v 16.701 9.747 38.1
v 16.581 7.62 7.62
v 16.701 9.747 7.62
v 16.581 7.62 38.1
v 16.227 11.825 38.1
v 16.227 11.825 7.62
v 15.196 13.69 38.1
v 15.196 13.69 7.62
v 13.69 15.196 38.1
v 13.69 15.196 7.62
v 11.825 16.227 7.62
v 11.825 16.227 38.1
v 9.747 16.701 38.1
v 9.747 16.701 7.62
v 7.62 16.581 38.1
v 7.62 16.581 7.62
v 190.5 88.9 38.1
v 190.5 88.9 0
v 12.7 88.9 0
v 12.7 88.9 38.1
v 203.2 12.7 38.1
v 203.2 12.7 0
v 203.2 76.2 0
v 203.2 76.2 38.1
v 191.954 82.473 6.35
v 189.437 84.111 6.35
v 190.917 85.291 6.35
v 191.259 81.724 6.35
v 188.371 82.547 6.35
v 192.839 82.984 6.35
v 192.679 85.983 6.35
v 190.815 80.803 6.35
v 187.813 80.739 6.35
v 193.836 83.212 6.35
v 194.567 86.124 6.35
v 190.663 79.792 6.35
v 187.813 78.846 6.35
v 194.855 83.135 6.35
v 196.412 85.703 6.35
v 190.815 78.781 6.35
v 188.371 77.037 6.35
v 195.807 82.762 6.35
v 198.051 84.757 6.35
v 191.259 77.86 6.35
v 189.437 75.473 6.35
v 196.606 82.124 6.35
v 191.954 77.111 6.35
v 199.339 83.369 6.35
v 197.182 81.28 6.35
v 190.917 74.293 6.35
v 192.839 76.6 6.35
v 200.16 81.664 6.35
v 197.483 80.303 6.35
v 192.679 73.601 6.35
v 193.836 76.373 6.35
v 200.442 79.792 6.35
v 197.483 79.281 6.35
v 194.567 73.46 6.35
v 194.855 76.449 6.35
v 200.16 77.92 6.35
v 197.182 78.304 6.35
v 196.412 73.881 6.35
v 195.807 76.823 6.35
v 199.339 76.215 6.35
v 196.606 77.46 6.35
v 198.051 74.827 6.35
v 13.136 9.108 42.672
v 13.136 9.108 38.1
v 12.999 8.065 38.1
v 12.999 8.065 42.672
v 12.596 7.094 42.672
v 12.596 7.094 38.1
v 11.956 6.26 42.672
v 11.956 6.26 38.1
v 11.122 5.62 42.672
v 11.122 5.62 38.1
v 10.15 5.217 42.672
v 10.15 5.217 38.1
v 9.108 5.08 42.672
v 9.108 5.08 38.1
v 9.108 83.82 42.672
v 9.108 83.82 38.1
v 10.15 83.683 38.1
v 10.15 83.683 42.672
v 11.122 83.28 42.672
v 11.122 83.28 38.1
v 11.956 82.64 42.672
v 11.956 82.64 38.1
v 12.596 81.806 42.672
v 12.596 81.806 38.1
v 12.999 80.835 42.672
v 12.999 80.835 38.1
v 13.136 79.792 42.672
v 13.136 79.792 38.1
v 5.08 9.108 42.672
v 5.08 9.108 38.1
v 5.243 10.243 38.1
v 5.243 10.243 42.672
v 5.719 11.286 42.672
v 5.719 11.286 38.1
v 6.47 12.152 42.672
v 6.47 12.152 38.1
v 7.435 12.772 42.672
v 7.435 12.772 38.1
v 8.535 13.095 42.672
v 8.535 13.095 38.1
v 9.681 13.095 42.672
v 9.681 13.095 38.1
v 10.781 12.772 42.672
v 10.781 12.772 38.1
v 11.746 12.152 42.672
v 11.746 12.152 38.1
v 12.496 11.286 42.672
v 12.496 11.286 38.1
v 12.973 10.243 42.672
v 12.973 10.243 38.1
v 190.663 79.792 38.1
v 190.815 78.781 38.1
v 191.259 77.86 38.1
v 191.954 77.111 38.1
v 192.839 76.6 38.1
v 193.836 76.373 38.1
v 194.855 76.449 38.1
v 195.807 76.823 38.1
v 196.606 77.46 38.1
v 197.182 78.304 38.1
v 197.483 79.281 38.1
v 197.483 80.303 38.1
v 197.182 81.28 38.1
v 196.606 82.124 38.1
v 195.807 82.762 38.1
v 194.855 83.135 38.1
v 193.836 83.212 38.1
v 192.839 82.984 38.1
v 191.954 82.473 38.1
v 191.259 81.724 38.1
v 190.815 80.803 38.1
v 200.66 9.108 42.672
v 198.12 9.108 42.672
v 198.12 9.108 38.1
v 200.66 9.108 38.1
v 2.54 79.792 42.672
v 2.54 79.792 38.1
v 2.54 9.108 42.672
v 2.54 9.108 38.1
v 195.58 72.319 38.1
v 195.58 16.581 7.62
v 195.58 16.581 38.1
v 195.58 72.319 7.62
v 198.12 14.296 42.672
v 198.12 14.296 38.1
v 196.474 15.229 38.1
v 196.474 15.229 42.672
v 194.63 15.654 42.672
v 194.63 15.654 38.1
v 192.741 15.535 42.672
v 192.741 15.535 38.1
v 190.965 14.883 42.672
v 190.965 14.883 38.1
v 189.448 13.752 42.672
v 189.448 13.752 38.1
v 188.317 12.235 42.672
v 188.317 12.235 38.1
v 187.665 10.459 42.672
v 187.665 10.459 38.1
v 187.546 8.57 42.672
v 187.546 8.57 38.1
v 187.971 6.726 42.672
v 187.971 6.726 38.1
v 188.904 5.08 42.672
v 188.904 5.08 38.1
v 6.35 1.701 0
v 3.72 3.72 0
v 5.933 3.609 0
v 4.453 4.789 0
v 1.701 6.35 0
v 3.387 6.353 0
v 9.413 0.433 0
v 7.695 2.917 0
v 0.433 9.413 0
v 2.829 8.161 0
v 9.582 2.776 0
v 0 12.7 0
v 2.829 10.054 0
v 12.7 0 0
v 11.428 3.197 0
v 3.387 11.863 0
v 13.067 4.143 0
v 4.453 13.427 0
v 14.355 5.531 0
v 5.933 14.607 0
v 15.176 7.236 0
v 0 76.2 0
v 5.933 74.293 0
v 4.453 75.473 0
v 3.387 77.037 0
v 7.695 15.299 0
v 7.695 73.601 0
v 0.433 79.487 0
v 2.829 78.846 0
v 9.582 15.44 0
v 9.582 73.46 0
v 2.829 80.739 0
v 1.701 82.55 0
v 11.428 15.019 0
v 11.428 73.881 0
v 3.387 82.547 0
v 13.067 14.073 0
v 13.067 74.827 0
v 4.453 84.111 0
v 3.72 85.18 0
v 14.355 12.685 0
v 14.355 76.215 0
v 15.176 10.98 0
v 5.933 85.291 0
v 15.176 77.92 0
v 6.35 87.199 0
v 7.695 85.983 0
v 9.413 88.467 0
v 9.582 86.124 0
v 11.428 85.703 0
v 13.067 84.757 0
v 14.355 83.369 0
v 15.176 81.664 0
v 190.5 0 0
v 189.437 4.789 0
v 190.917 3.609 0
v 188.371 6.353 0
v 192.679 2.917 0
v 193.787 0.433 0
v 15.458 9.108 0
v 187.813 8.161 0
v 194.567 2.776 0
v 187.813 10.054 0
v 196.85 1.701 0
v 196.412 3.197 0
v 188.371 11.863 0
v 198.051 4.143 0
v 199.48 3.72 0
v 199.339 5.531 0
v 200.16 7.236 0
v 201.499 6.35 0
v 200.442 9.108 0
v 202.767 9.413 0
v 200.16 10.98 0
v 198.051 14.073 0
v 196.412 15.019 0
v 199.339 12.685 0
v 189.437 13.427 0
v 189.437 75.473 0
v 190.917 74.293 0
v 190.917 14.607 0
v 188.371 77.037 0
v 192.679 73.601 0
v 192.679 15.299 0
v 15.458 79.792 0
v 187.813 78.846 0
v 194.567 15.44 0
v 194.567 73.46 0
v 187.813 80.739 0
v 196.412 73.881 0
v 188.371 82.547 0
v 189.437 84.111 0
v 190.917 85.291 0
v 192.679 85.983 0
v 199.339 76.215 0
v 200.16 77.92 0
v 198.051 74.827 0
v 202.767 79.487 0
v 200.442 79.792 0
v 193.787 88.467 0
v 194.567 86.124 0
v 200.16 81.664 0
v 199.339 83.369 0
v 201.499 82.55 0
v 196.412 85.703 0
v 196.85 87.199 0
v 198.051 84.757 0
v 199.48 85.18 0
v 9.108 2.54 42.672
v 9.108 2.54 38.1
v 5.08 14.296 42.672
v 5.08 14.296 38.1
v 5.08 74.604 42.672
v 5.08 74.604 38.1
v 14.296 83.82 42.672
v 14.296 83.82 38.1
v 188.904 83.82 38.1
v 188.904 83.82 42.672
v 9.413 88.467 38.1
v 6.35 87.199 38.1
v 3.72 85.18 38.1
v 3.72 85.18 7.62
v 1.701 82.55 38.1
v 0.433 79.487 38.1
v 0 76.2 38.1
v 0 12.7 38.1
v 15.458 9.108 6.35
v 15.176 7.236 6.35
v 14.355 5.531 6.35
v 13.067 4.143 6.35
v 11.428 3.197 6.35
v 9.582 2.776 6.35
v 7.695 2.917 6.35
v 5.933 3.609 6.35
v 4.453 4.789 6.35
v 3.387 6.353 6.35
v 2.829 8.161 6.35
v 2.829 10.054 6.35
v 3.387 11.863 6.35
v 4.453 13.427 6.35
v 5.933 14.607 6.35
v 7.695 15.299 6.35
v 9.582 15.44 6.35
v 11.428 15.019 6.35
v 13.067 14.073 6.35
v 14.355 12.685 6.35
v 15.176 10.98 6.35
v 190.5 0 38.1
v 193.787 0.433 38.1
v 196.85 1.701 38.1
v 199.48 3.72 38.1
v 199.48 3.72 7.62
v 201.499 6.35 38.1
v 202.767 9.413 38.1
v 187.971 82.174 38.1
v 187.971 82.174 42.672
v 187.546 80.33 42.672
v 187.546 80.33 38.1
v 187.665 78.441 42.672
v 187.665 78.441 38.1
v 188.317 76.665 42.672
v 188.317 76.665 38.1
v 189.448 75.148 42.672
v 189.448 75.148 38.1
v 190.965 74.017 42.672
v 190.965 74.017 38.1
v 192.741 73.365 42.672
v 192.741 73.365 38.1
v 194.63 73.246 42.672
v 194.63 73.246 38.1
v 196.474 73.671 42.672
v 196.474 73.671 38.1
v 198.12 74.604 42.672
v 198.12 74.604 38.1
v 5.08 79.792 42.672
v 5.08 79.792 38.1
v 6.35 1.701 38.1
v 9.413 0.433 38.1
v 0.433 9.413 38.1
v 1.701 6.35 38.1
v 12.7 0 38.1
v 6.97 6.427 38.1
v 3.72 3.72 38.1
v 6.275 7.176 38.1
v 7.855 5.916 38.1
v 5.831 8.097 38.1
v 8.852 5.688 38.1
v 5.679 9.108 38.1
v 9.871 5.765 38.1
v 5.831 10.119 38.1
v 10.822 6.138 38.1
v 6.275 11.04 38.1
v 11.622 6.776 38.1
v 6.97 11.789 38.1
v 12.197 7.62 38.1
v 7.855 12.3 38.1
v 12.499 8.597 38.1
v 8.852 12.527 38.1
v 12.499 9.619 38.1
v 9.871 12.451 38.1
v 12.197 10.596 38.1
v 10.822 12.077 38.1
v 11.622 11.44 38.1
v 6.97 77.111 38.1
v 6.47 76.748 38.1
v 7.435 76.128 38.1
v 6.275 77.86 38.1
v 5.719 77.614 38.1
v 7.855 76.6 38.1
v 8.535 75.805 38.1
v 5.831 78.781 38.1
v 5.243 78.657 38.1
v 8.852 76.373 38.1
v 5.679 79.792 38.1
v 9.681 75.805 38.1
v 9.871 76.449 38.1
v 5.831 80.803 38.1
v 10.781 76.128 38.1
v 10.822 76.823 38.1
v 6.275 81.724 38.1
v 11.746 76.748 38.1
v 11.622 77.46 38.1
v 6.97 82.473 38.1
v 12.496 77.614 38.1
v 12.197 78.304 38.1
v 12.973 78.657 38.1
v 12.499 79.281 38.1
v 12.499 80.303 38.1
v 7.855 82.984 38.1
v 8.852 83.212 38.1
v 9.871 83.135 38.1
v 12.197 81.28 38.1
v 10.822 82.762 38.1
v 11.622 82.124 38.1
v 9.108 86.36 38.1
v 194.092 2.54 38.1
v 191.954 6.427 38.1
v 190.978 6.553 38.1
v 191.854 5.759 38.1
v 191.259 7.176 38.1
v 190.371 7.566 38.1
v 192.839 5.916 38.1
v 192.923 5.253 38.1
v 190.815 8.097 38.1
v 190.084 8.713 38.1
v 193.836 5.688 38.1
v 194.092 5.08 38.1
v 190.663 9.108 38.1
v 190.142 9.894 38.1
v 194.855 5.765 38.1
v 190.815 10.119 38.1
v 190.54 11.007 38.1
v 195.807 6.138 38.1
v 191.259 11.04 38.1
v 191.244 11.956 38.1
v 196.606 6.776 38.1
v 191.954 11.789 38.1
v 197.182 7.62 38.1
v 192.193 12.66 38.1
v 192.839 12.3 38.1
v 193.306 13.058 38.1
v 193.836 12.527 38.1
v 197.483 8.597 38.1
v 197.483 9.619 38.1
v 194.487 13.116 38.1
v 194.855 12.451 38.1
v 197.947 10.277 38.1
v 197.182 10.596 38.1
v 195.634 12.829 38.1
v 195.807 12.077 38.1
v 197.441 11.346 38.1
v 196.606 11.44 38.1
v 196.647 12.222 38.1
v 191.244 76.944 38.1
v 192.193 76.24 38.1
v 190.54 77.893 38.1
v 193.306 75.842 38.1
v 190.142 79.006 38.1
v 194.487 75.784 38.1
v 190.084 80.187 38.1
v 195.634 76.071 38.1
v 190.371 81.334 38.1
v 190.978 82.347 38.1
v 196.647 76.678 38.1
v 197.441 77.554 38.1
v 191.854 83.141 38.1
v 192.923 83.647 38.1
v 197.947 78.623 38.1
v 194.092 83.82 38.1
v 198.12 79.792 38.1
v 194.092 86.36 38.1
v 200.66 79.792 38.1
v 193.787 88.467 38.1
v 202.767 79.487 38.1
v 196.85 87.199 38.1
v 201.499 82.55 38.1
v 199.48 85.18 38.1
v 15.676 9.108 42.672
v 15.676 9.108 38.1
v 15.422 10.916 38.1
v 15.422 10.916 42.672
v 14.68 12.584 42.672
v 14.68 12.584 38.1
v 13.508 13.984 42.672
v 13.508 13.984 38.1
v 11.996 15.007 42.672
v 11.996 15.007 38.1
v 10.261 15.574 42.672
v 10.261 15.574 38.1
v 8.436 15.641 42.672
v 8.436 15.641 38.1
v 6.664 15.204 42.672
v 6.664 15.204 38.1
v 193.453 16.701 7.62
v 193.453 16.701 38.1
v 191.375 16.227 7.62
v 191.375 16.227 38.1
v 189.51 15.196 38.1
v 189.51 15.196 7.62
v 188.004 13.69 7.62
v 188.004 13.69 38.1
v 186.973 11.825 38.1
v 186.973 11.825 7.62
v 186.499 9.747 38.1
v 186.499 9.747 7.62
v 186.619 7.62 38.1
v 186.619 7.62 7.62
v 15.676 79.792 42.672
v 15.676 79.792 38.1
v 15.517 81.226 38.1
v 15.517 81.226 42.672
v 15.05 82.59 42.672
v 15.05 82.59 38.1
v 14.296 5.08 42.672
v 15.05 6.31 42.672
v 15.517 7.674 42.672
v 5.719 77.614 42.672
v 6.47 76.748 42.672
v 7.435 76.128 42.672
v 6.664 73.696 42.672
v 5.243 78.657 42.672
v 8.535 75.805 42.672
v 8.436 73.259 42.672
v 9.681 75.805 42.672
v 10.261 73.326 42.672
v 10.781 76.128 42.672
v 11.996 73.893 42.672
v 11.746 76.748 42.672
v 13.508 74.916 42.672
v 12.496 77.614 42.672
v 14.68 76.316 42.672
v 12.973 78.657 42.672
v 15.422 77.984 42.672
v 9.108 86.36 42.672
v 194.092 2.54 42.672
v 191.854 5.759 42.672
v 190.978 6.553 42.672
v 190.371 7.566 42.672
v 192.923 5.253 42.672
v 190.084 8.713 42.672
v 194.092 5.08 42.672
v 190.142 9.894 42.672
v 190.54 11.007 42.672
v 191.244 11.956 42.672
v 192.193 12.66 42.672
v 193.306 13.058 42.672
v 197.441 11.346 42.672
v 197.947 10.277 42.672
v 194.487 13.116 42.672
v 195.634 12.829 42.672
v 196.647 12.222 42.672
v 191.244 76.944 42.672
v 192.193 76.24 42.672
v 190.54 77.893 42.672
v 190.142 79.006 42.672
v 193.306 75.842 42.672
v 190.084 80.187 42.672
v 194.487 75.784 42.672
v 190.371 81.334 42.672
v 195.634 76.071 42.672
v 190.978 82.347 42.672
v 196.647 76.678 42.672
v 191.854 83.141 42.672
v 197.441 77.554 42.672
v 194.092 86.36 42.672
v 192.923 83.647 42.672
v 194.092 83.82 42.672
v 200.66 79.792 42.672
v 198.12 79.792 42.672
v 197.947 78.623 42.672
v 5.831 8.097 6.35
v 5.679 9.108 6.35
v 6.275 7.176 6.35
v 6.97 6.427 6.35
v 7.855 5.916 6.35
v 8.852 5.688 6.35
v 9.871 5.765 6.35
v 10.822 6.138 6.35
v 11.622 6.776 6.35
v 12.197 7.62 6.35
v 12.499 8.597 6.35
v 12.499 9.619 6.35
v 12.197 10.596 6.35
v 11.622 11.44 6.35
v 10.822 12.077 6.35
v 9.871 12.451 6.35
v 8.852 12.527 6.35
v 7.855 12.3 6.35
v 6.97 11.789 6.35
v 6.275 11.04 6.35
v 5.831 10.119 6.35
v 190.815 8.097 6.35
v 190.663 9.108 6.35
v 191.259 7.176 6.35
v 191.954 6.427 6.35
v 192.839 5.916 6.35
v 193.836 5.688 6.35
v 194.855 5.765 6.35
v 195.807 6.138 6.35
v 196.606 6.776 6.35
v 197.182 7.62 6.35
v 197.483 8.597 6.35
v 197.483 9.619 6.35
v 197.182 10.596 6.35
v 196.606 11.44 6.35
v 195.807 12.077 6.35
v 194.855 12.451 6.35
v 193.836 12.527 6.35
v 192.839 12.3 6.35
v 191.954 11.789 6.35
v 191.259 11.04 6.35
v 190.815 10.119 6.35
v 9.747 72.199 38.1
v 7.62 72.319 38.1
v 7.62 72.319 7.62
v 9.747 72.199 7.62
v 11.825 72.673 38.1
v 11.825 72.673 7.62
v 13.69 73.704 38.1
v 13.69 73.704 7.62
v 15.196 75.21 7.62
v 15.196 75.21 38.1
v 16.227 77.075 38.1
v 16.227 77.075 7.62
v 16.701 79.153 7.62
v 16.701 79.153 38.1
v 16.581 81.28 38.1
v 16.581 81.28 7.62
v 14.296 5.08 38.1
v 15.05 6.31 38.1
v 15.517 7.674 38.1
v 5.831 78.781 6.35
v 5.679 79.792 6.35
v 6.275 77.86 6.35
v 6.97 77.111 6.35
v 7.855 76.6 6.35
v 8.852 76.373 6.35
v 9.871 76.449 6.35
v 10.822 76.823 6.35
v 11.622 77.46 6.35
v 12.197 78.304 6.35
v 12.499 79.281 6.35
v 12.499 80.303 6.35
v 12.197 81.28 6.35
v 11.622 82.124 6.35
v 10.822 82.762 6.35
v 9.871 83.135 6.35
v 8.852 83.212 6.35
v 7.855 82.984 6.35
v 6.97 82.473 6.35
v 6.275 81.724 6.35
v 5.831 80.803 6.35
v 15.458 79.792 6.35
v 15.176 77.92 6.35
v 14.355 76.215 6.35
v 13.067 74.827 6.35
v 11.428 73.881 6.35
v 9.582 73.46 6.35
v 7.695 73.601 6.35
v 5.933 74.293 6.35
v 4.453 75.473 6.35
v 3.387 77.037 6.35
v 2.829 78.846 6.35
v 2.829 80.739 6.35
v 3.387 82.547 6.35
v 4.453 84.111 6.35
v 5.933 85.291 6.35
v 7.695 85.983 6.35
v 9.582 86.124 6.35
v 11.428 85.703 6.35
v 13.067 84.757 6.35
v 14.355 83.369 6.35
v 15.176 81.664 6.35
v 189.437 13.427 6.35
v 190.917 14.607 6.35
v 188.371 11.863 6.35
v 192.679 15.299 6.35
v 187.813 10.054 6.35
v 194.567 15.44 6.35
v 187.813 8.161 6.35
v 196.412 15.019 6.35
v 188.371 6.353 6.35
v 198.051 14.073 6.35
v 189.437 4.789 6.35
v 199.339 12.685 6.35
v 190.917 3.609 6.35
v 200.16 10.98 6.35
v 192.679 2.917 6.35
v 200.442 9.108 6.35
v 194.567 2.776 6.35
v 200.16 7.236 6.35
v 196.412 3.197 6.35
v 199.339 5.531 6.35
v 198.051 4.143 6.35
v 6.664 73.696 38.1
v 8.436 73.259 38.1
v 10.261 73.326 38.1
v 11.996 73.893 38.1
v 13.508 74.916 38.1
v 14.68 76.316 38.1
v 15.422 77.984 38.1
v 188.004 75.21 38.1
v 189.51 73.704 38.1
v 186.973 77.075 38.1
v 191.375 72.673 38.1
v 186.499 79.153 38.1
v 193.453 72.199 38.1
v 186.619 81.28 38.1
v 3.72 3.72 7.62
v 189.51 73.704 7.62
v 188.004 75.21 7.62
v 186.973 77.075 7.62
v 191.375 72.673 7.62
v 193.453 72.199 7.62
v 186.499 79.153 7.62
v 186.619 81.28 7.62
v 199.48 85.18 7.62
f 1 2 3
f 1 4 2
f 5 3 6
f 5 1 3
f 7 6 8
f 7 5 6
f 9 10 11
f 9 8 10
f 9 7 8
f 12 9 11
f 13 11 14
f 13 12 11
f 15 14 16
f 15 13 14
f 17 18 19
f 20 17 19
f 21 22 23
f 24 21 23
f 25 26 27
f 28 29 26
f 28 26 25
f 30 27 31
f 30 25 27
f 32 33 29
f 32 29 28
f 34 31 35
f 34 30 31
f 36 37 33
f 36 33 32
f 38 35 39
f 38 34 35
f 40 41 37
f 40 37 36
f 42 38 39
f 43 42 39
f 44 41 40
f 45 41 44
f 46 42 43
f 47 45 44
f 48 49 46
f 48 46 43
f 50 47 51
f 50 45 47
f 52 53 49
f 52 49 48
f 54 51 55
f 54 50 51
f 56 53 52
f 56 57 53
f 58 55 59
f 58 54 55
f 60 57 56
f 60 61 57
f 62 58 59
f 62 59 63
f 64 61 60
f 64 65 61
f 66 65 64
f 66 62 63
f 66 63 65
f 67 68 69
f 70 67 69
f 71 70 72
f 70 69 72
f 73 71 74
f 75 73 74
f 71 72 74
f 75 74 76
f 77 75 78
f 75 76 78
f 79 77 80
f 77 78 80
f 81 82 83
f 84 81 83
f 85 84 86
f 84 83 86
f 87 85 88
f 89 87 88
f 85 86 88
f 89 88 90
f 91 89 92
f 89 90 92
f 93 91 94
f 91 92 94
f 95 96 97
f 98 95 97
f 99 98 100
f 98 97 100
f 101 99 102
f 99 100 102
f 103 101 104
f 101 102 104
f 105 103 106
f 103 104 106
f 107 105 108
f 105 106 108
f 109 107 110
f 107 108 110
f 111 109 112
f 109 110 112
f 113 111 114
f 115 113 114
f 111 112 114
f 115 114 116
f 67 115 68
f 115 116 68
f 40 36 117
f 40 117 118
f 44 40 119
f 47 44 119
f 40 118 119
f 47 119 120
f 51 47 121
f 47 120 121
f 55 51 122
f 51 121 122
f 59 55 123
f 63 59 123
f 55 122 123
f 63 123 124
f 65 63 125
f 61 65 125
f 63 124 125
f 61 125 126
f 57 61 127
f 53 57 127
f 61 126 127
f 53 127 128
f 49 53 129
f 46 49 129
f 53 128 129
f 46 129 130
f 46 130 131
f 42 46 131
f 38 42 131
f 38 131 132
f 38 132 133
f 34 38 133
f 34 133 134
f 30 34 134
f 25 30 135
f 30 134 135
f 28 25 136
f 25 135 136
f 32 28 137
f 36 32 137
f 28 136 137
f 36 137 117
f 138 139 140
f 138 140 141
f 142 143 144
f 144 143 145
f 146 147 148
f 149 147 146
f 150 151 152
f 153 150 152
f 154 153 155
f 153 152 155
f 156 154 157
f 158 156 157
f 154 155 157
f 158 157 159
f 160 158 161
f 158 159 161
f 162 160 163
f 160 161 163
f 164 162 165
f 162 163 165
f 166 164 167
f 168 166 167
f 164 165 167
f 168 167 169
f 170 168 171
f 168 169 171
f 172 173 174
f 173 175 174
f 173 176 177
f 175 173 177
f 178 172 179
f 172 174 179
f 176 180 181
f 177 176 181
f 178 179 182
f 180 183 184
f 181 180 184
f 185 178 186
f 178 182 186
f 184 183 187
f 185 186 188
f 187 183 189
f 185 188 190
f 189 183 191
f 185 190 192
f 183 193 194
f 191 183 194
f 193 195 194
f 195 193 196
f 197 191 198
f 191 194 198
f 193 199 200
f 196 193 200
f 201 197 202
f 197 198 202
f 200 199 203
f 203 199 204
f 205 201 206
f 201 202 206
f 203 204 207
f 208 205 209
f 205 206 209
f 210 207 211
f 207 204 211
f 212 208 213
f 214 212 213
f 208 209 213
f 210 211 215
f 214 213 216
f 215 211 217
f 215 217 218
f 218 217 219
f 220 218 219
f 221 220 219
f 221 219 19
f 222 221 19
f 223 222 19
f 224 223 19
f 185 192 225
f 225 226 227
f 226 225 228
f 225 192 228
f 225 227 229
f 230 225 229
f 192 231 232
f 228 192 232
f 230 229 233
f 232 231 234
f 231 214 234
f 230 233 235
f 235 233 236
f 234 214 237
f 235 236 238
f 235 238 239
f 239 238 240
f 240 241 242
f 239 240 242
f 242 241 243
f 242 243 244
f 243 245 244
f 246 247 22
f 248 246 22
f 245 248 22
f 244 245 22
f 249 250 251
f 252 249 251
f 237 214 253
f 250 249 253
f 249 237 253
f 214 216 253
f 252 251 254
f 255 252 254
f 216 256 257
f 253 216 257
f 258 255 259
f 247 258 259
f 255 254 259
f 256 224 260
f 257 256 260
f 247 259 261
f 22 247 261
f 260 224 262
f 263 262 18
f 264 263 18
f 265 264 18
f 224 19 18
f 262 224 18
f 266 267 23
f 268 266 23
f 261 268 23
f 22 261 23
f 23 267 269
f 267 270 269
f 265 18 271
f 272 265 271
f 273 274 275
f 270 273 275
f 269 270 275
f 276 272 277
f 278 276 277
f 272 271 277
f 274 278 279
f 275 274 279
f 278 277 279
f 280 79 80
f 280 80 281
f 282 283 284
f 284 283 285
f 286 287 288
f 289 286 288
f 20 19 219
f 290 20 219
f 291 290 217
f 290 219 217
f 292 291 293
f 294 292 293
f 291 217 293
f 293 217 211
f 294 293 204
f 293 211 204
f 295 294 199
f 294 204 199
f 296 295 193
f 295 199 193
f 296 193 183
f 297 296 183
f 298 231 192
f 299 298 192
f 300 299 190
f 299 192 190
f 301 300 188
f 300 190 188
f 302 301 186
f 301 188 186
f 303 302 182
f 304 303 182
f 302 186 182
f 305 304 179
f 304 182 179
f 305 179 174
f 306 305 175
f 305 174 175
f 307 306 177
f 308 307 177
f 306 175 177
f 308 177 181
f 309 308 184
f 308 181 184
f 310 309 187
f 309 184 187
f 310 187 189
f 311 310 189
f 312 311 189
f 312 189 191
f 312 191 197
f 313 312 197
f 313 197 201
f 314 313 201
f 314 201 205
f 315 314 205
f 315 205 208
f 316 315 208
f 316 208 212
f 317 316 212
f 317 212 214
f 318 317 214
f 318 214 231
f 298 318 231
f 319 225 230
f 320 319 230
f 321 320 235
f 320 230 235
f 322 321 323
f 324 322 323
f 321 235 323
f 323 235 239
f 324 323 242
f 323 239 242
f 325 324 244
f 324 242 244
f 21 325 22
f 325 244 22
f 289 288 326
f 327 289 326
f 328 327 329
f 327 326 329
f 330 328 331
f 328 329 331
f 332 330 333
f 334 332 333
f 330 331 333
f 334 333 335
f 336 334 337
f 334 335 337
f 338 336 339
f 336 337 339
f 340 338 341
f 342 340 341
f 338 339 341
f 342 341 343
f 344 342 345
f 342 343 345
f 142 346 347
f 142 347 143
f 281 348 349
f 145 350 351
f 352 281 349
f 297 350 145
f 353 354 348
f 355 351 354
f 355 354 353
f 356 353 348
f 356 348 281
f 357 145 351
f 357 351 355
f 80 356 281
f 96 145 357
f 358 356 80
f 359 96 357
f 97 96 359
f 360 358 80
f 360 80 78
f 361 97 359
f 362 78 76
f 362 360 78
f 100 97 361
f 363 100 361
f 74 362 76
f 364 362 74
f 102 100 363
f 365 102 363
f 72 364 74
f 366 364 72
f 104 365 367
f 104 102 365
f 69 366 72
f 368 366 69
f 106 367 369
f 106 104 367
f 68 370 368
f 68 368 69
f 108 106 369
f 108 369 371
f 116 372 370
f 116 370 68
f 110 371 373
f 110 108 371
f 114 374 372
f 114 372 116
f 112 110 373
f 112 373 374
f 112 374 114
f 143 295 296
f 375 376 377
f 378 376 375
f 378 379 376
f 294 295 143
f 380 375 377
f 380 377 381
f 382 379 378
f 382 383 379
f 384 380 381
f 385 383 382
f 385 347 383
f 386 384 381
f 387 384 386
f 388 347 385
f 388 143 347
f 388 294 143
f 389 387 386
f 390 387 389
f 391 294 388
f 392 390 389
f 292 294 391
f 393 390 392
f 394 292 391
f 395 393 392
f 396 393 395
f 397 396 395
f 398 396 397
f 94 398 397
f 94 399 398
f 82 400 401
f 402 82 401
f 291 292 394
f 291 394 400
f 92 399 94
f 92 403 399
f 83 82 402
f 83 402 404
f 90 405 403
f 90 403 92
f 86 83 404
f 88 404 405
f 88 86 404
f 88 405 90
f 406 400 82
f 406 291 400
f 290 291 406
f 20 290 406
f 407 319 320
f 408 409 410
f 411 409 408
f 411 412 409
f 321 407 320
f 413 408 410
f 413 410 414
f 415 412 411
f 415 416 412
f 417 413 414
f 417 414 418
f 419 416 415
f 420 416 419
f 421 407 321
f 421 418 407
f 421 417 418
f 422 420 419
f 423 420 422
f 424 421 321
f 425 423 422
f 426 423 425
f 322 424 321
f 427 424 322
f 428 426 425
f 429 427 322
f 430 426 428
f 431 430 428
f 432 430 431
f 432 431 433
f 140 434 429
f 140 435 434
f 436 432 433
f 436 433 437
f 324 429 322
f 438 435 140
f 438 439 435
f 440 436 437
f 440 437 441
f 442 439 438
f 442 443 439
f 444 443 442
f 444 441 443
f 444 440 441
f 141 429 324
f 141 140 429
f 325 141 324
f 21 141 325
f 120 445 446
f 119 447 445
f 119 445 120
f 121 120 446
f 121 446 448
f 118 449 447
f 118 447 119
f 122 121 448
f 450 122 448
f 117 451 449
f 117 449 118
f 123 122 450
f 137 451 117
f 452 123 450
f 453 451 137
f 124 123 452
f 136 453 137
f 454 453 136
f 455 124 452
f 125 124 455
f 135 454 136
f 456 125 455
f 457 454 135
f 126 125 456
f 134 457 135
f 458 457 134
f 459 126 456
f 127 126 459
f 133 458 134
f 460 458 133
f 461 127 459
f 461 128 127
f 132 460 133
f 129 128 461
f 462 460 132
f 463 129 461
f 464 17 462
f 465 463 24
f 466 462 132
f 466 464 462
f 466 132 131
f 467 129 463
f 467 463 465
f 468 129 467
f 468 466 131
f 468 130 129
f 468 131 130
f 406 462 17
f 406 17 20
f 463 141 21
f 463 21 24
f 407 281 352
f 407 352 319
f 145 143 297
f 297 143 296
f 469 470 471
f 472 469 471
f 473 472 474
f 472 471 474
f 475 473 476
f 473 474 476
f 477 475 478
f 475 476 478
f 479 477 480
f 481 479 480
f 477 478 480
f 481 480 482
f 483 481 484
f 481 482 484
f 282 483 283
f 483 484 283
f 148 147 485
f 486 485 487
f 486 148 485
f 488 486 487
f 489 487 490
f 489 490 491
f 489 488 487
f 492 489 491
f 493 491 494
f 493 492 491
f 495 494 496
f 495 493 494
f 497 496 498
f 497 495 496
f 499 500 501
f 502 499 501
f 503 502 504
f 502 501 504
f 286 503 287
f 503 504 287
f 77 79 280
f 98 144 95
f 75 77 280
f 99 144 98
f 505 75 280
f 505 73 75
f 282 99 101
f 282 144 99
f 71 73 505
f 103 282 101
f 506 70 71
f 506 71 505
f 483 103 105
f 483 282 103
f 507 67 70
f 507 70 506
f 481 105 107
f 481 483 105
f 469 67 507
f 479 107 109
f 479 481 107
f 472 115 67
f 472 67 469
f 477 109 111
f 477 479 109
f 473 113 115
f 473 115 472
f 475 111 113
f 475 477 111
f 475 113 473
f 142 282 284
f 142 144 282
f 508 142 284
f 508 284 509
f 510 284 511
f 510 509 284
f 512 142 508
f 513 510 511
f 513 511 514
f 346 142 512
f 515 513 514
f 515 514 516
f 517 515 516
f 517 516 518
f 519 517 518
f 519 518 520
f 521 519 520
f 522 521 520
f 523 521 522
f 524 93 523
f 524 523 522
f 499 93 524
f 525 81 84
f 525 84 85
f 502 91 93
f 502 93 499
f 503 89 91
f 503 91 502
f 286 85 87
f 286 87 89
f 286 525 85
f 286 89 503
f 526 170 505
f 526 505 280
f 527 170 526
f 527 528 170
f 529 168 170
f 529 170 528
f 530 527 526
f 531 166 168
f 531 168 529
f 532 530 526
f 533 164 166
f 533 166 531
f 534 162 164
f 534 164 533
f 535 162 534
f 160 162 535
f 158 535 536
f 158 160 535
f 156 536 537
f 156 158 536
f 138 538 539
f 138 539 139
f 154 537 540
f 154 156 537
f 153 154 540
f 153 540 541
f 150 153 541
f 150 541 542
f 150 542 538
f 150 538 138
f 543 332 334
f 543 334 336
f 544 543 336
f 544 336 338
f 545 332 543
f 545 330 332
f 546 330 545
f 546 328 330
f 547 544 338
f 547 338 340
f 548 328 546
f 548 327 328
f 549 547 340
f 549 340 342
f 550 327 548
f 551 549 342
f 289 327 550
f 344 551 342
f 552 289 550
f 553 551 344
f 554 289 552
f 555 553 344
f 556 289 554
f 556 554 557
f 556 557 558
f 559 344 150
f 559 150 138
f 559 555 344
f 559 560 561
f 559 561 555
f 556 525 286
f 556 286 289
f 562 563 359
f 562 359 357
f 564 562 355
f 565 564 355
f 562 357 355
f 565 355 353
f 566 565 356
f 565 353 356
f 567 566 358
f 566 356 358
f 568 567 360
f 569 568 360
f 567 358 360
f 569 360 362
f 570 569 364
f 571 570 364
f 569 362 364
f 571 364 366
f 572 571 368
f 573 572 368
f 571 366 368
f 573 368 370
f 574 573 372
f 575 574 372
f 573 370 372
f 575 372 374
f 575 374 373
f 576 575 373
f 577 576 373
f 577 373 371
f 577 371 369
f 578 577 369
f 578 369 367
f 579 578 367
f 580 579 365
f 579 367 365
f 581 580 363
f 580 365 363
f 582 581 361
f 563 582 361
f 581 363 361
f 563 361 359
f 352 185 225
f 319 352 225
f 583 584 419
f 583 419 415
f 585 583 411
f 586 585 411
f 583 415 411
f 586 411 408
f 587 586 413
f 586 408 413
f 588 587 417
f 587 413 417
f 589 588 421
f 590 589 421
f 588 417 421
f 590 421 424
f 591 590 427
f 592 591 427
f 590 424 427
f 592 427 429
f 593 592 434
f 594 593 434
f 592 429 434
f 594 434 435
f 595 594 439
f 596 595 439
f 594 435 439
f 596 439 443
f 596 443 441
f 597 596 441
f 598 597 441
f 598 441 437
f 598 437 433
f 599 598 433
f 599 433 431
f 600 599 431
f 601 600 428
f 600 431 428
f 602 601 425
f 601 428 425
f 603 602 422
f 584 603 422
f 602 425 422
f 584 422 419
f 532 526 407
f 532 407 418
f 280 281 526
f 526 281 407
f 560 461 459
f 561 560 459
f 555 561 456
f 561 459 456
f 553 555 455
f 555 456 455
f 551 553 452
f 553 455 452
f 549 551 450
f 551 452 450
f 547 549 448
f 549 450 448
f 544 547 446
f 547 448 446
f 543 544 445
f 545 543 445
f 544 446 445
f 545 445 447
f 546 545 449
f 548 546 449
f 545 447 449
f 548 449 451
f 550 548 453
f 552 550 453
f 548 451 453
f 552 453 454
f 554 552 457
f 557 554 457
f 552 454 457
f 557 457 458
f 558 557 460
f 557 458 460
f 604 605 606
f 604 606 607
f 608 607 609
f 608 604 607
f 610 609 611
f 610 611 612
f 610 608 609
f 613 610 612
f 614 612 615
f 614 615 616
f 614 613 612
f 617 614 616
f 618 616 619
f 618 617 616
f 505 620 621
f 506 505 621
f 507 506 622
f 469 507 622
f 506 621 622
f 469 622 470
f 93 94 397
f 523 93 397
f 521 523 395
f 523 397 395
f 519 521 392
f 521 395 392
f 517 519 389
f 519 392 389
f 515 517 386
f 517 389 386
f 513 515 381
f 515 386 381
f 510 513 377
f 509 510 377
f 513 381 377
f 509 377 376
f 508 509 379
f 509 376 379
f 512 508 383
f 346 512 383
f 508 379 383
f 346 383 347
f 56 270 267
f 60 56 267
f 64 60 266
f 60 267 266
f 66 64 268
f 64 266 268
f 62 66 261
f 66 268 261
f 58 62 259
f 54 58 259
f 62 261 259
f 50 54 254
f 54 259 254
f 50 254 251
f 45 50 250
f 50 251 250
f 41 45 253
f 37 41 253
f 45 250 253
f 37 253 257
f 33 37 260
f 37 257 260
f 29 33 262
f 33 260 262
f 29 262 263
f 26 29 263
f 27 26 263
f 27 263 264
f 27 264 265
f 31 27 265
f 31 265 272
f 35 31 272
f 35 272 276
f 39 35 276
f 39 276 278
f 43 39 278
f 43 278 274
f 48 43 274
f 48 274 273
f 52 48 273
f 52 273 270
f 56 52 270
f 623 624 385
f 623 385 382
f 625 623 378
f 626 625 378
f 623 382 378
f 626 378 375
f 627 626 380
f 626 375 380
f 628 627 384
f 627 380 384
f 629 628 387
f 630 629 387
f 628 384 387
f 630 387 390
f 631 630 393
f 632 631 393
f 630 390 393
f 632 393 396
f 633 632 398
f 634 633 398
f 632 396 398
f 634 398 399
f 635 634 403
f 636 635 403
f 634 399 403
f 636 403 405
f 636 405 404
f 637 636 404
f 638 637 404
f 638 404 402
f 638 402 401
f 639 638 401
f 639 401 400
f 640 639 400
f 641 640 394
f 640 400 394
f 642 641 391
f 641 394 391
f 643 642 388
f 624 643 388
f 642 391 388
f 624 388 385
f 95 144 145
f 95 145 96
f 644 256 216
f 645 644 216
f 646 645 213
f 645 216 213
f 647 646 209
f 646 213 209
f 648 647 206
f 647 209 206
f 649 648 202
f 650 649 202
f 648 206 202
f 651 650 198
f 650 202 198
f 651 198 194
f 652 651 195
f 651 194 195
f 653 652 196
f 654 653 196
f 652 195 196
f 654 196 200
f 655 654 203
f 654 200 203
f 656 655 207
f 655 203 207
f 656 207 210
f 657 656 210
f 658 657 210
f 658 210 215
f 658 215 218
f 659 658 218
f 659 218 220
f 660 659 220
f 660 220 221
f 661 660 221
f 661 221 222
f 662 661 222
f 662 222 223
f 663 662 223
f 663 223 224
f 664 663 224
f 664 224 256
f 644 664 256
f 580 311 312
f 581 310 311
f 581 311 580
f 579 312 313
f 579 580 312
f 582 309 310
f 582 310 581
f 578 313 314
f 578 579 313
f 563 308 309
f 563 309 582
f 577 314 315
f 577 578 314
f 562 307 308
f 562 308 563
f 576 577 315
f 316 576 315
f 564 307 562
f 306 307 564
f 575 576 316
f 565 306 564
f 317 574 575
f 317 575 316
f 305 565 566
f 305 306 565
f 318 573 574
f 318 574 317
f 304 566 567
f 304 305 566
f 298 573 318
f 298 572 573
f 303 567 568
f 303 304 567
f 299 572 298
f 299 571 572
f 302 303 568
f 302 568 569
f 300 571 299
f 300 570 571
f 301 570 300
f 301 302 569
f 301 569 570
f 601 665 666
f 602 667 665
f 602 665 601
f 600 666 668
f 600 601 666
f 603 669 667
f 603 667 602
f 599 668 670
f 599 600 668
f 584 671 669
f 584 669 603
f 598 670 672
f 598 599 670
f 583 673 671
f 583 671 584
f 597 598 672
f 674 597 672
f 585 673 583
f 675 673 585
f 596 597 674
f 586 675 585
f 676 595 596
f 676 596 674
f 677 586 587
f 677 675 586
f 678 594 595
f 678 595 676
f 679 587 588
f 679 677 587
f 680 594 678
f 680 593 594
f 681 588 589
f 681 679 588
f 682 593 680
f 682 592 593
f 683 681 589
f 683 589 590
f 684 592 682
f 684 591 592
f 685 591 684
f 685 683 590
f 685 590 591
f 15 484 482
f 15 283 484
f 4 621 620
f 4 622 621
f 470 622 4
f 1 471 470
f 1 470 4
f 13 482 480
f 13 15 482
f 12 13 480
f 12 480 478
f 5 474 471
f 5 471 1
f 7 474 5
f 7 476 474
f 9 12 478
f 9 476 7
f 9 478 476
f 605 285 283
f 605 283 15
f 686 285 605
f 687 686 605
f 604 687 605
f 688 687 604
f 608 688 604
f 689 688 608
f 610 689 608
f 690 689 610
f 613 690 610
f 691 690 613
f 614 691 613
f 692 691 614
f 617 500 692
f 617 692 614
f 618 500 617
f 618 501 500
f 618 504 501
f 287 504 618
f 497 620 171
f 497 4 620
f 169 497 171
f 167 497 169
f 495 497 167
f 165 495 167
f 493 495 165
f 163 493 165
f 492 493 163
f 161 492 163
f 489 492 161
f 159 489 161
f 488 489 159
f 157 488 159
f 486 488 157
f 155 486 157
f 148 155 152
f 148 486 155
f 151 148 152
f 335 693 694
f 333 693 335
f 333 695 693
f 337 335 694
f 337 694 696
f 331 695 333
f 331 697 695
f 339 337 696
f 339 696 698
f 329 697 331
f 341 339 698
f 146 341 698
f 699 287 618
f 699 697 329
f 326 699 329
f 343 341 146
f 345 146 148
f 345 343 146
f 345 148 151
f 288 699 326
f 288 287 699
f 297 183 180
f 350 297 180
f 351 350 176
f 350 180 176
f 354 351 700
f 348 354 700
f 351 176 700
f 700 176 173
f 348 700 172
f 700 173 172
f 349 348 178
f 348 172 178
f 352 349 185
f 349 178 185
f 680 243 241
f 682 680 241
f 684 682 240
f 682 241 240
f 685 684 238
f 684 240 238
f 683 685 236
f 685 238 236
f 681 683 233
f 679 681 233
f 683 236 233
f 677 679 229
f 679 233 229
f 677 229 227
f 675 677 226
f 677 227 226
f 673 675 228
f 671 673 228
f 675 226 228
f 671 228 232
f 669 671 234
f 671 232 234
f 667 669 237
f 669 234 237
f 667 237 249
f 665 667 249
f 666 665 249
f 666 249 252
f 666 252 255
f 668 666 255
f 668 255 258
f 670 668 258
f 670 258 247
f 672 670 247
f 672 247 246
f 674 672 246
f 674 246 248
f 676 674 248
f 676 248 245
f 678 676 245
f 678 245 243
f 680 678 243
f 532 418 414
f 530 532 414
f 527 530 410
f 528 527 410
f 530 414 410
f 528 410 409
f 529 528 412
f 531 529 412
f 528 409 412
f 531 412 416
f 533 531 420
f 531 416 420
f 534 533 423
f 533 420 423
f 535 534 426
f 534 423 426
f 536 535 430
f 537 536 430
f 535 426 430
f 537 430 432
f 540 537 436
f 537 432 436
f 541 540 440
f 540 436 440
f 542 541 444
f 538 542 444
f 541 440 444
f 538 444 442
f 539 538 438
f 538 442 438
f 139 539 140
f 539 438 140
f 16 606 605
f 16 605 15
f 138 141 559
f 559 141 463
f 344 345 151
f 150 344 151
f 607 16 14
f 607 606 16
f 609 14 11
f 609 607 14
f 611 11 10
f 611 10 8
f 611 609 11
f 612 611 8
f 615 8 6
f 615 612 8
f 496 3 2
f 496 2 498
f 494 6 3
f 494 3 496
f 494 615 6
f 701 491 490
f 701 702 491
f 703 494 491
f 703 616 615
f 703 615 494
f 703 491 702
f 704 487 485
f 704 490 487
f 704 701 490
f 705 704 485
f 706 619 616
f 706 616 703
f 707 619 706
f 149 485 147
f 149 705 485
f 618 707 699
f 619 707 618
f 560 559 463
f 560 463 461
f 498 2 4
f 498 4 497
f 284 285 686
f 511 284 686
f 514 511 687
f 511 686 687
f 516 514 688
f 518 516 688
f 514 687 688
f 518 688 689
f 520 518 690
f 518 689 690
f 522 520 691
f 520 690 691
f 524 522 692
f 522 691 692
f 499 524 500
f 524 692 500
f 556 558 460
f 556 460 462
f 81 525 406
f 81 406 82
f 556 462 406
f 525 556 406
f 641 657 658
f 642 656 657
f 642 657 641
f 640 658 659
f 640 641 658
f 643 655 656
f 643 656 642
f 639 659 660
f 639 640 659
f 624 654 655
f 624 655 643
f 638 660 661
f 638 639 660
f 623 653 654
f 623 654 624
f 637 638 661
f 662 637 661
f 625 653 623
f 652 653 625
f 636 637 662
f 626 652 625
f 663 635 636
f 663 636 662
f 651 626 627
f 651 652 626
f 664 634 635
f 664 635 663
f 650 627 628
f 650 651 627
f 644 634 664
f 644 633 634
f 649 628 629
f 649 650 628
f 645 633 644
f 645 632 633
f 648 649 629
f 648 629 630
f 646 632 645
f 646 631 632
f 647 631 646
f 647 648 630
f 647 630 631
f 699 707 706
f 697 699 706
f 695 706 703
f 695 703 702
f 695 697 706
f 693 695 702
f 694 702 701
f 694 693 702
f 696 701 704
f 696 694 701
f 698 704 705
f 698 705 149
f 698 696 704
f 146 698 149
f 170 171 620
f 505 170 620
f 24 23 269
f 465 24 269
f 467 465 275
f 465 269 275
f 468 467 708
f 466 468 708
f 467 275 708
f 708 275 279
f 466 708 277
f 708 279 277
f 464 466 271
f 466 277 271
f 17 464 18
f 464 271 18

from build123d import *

# Parameters (mm, degrees)
F1_DEPTH       = 38.1
F2_T           = -7.62
F3_R           = 7.62
F4_DEPTH       = 30.48
F6_DEPTH       = 4.572
F8_D           = 6.858
F8_CBORE_D     = 12.7
F8_CBORE_DEPTH = 6.35


with BuildPart() as f1:
    # F0 (on Top) → F1 (new body)
    with BuildSketch(Plane.XY):
        with BuildLine():
            ThreePointArc((0, 12.7), (3.7197438789, 3.7197438789), (12.7, 0))
            Line((12.7, 0), (190.5, 0))
            ThreePointArc((190.5, 0), (199.4802561211, 3.7197438789), (203.2, 12.7))
            Line((203.2, 12.7), (203.2, 44.45))
            Line((203.2, 44.45), (203.2, 76.2))
            ThreePointArc((203.2, 76.2), (199.4802561211, 85.1802561211), (190.5, 88.9))
            Line((190.5, 88.9), (12.7, 88.9))
            ThreePointArc((12.7, 88.9), (3.7197438789, 85.1802561211), (0, 76.2))
            Line((0, 76.2), (0, 44.45))
            Line((0, 44.45), (0, 12.7))
        make_face()
    extrude(amount=F1_DEPTH)

    # F2
    f2_openings = [f1.faces().sort_by_distance(p)[0] for p in [
        (101.6, 44.45, 38.1),
    ]]
    offset(amount=F2_T, openings=f2_openings)

    # F3 (on face) → F4 (join, through all)
    with BuildSketch(Plane.XY.offset(38.1)):
        with Locations((9.1078975516, 79.7921024484)):
            Circle(F3_R)
        with Locations((194.0921024484, 79.7921024484)):
            Circle(F3_R)
        with Locations((9.1078975516, 9.1078975516)):
            Circle(F3_R)
        with Locations((194.0921024484, 9.1078975516)):
            Circle(F3_R)
    extrude(amount=-F4_DEPTH)

    # F5 (on face) → F6 (join)
    with BuildSketch(Plane.XY.offset(38.1)):
        with BuildLine():
            ThreePointArc((14.2957024402, 83.82), (11.9960162975, 85.6909199873), (9.1078975516, 86.36))
            Line((9.1078975516, 86.36), (9.1078975516, 83.82))
            ThreePointArc((9.1078975516, 83.82), (11.9560512242, 82.6402561211), (13.1357951031, 79.7921024484))
            ThreePointArc((13.1357951031, 79.7921024484), (9.1078975516, 75.7642048969), (5.08, 79.7921024484))
            Line((5.08, 79.7921024484), (2.54, 79.7921024484))
            ThreePointArc((2.54, 79.7921024484), (3.2090800127, 76.9039837025), (5.08, 74.6042975598))
            ThreePointArc((5.08, 74.6042975598), (11.9960162975, 73.8932849095), (15.6757951031, 79.7921024484))
            ThreePointArc((15.6757951031, 79.7921024484), (15.3211997844, 81.9209879811), (14.2957024402, 83.82))
        make_face()
        with BuildLine():
            Line((194.0921024484, 86.36), (101.6, 86.36))
            Line((101.6, 86.36), (9.1078975516, 86.36))
            ThreePointArc((9.1078975516, 86.36), (11.9960162975, 85.6909199873), (14.2957024402, 83.82))
            Line((14.2957024402, 83.82), (101.6, 83.82))
            Line((101.6, 83.82), (188.9042975598, 83.82))
            ThreePointArc((188.9042975598, 83.82), (191.2039837025, 85.6909199873), (194.0921024484, 86.36))
        make_face()
        with BuildLine():
            Line((194.0921024484, 83.82), (194.0921024484, 86.36))
            ThreePointArc((194.0921024484, 86.36), (191.2039837025, 85.6909199873), (188.9042975598, 83.82))
            ThreePointArc((188.9042975598, 83.82), (189.4478975516, 75.1478975516), (198.12, 74.6042975598))
            ThreePointArc((198.12, 74.6042975598), (199.9909199873, 76.9039837025), (200.66, 79.7921024484))
            Line((200.66, 79.7921024484), (198.12, 79.7921024484))
            ThreePointArc((198.12, 79.7921024484), (191.2439487758, 76.9439487758), (194.0921024484, 83.82))
        make_face()
        with BuildLine():
            Line((200.66, 44.45), (200.66, 79.7921024484))
            ThreePointArc((200.66, 79.7921024484), (199.9909199873, 76.9039837025), (198.12, 74.6042975598))
            Line((198.12, 74.6042975598), (198.12, 44.45))
            Line((198.12, 44.45), (198.12, 14.2957024402))
            ThreePointArc((198.12, 14.2957024402), (199.9909199873, 11.9960162975), (200.66, 9.1078975516))
            Line((200.66, 9.1078975516), (200.66, 44.45))
        make_face()
        with BuildLine():
            Line((198.12, 9.1078975516), (200.66, 9.1078975516))
            ThreePointArc((200.66, 9.1078975516), (199.9909199873, 11.9960162975), (198.12, 14.2957024402))
            ThreePointArc((198.12, 14.2957024402), (189.4478975516, 13.7521024484), (188.9042975598, 5.08))
            ThreePointArc((188.9042975598, 5.08), (191.2039837025, 3.2090800127), (194.0921024484, 2.54))
            Line((194.0921024484, 2.54), (194.0921024484, 5.08))
            ThreePointArc((194.0921024484, 5.08), (191.2439487758, 11.9560512242), (198.12, 9.1078975516))
        make_face()
        with BuildLine():
            Line((101.6, 2.54), (194.0921024484, 2.54))
            ThreePointArc((194.0921024484, 2.54), (191.2039837025, 3.2090800127), (188.9042975598, 5.08))
            Line((188.9042975598, 5.08), (101.6, 5.08))
            Line((101.6, 5.08), (14.2957024402, 5.08))
            ThreePointArc((14.2957024402, 5.08), (11.9960162975, 3.2090800127), (9.1078975516, 2.54))
            Line((9.1078975516, 2.54), (101.6, 2.54))
        make_face()
        with BuildLine():
            ThreePointArc((5.08, 14.2957024402), (3.2090800127, 11.9960162975), (2.54, 9.1078975516))
            Line((2.54, 9.1078975516), (5.08, 9.1078975516))
            ThreePointArc((5.08, 9.1078975516), (9.1078975516, 13.1357951031), (13.1357951031, 9.1078975516))
            ThreePointArc((13.1357951031, 9.1078975516), (11.9560512242, 6.2597438789), (9.1078975516, 5.08))
            Line((9.1078975516, 5.08), (9.1078975516, 2.54))
            ThreePointArc((9.1078975516, 2.54), (11.9960162975, 3.2090800127), (14.2957024402, 5.08))
            ThreePointArc((14.2957024402, 5.08), (15.3211997844, 6.9790120189), (15.6757951031, 9.1078975516))
            ThreePointArc((15.6757951031, 9.1078975516), (11.9960162975, 15.0067150905), (5.08, 14.2957024402))
        make_face()
        with BuildLine():
            ThreePointArc((5.08, 74.6042975598), (3.2090800127, 76.9039837025), (2.54, 79.7921024484))
            Line((2.54, 79.7921024484), (2.54, 44.45))
            Line((2.54, 44.45), (2.54, 9.1078975516))
            ThreePointArc((2.54, 9.1078975516), (3.2090800127, 11.9960162975), (5.08, 14.2957024402))
            Line((5.08, 14.2957024402), (5.08, 44.45))
            Line((5.08, 44.45), (5.08, 74.6042975598))
        make_face()
    extrude(amount=F6_DEPTH)

    # F8 (through all)
    with Locations(Plane(origin=(0, 0, 0), x_dir=(1, 0, 0), z_dir=(0, 0, -1))):
        with Locations((194.0921024484, -79.7921024484), (194.0921024484, -9.1078975516), (9.1078975516, -9.1078975516), (9.1078975516, -79.7921024484)):
            CounterBoreHole(F8_D / 2, F8_CBORE_D / 2, F8_CBORE_DEPTH)


solid = f1.part
